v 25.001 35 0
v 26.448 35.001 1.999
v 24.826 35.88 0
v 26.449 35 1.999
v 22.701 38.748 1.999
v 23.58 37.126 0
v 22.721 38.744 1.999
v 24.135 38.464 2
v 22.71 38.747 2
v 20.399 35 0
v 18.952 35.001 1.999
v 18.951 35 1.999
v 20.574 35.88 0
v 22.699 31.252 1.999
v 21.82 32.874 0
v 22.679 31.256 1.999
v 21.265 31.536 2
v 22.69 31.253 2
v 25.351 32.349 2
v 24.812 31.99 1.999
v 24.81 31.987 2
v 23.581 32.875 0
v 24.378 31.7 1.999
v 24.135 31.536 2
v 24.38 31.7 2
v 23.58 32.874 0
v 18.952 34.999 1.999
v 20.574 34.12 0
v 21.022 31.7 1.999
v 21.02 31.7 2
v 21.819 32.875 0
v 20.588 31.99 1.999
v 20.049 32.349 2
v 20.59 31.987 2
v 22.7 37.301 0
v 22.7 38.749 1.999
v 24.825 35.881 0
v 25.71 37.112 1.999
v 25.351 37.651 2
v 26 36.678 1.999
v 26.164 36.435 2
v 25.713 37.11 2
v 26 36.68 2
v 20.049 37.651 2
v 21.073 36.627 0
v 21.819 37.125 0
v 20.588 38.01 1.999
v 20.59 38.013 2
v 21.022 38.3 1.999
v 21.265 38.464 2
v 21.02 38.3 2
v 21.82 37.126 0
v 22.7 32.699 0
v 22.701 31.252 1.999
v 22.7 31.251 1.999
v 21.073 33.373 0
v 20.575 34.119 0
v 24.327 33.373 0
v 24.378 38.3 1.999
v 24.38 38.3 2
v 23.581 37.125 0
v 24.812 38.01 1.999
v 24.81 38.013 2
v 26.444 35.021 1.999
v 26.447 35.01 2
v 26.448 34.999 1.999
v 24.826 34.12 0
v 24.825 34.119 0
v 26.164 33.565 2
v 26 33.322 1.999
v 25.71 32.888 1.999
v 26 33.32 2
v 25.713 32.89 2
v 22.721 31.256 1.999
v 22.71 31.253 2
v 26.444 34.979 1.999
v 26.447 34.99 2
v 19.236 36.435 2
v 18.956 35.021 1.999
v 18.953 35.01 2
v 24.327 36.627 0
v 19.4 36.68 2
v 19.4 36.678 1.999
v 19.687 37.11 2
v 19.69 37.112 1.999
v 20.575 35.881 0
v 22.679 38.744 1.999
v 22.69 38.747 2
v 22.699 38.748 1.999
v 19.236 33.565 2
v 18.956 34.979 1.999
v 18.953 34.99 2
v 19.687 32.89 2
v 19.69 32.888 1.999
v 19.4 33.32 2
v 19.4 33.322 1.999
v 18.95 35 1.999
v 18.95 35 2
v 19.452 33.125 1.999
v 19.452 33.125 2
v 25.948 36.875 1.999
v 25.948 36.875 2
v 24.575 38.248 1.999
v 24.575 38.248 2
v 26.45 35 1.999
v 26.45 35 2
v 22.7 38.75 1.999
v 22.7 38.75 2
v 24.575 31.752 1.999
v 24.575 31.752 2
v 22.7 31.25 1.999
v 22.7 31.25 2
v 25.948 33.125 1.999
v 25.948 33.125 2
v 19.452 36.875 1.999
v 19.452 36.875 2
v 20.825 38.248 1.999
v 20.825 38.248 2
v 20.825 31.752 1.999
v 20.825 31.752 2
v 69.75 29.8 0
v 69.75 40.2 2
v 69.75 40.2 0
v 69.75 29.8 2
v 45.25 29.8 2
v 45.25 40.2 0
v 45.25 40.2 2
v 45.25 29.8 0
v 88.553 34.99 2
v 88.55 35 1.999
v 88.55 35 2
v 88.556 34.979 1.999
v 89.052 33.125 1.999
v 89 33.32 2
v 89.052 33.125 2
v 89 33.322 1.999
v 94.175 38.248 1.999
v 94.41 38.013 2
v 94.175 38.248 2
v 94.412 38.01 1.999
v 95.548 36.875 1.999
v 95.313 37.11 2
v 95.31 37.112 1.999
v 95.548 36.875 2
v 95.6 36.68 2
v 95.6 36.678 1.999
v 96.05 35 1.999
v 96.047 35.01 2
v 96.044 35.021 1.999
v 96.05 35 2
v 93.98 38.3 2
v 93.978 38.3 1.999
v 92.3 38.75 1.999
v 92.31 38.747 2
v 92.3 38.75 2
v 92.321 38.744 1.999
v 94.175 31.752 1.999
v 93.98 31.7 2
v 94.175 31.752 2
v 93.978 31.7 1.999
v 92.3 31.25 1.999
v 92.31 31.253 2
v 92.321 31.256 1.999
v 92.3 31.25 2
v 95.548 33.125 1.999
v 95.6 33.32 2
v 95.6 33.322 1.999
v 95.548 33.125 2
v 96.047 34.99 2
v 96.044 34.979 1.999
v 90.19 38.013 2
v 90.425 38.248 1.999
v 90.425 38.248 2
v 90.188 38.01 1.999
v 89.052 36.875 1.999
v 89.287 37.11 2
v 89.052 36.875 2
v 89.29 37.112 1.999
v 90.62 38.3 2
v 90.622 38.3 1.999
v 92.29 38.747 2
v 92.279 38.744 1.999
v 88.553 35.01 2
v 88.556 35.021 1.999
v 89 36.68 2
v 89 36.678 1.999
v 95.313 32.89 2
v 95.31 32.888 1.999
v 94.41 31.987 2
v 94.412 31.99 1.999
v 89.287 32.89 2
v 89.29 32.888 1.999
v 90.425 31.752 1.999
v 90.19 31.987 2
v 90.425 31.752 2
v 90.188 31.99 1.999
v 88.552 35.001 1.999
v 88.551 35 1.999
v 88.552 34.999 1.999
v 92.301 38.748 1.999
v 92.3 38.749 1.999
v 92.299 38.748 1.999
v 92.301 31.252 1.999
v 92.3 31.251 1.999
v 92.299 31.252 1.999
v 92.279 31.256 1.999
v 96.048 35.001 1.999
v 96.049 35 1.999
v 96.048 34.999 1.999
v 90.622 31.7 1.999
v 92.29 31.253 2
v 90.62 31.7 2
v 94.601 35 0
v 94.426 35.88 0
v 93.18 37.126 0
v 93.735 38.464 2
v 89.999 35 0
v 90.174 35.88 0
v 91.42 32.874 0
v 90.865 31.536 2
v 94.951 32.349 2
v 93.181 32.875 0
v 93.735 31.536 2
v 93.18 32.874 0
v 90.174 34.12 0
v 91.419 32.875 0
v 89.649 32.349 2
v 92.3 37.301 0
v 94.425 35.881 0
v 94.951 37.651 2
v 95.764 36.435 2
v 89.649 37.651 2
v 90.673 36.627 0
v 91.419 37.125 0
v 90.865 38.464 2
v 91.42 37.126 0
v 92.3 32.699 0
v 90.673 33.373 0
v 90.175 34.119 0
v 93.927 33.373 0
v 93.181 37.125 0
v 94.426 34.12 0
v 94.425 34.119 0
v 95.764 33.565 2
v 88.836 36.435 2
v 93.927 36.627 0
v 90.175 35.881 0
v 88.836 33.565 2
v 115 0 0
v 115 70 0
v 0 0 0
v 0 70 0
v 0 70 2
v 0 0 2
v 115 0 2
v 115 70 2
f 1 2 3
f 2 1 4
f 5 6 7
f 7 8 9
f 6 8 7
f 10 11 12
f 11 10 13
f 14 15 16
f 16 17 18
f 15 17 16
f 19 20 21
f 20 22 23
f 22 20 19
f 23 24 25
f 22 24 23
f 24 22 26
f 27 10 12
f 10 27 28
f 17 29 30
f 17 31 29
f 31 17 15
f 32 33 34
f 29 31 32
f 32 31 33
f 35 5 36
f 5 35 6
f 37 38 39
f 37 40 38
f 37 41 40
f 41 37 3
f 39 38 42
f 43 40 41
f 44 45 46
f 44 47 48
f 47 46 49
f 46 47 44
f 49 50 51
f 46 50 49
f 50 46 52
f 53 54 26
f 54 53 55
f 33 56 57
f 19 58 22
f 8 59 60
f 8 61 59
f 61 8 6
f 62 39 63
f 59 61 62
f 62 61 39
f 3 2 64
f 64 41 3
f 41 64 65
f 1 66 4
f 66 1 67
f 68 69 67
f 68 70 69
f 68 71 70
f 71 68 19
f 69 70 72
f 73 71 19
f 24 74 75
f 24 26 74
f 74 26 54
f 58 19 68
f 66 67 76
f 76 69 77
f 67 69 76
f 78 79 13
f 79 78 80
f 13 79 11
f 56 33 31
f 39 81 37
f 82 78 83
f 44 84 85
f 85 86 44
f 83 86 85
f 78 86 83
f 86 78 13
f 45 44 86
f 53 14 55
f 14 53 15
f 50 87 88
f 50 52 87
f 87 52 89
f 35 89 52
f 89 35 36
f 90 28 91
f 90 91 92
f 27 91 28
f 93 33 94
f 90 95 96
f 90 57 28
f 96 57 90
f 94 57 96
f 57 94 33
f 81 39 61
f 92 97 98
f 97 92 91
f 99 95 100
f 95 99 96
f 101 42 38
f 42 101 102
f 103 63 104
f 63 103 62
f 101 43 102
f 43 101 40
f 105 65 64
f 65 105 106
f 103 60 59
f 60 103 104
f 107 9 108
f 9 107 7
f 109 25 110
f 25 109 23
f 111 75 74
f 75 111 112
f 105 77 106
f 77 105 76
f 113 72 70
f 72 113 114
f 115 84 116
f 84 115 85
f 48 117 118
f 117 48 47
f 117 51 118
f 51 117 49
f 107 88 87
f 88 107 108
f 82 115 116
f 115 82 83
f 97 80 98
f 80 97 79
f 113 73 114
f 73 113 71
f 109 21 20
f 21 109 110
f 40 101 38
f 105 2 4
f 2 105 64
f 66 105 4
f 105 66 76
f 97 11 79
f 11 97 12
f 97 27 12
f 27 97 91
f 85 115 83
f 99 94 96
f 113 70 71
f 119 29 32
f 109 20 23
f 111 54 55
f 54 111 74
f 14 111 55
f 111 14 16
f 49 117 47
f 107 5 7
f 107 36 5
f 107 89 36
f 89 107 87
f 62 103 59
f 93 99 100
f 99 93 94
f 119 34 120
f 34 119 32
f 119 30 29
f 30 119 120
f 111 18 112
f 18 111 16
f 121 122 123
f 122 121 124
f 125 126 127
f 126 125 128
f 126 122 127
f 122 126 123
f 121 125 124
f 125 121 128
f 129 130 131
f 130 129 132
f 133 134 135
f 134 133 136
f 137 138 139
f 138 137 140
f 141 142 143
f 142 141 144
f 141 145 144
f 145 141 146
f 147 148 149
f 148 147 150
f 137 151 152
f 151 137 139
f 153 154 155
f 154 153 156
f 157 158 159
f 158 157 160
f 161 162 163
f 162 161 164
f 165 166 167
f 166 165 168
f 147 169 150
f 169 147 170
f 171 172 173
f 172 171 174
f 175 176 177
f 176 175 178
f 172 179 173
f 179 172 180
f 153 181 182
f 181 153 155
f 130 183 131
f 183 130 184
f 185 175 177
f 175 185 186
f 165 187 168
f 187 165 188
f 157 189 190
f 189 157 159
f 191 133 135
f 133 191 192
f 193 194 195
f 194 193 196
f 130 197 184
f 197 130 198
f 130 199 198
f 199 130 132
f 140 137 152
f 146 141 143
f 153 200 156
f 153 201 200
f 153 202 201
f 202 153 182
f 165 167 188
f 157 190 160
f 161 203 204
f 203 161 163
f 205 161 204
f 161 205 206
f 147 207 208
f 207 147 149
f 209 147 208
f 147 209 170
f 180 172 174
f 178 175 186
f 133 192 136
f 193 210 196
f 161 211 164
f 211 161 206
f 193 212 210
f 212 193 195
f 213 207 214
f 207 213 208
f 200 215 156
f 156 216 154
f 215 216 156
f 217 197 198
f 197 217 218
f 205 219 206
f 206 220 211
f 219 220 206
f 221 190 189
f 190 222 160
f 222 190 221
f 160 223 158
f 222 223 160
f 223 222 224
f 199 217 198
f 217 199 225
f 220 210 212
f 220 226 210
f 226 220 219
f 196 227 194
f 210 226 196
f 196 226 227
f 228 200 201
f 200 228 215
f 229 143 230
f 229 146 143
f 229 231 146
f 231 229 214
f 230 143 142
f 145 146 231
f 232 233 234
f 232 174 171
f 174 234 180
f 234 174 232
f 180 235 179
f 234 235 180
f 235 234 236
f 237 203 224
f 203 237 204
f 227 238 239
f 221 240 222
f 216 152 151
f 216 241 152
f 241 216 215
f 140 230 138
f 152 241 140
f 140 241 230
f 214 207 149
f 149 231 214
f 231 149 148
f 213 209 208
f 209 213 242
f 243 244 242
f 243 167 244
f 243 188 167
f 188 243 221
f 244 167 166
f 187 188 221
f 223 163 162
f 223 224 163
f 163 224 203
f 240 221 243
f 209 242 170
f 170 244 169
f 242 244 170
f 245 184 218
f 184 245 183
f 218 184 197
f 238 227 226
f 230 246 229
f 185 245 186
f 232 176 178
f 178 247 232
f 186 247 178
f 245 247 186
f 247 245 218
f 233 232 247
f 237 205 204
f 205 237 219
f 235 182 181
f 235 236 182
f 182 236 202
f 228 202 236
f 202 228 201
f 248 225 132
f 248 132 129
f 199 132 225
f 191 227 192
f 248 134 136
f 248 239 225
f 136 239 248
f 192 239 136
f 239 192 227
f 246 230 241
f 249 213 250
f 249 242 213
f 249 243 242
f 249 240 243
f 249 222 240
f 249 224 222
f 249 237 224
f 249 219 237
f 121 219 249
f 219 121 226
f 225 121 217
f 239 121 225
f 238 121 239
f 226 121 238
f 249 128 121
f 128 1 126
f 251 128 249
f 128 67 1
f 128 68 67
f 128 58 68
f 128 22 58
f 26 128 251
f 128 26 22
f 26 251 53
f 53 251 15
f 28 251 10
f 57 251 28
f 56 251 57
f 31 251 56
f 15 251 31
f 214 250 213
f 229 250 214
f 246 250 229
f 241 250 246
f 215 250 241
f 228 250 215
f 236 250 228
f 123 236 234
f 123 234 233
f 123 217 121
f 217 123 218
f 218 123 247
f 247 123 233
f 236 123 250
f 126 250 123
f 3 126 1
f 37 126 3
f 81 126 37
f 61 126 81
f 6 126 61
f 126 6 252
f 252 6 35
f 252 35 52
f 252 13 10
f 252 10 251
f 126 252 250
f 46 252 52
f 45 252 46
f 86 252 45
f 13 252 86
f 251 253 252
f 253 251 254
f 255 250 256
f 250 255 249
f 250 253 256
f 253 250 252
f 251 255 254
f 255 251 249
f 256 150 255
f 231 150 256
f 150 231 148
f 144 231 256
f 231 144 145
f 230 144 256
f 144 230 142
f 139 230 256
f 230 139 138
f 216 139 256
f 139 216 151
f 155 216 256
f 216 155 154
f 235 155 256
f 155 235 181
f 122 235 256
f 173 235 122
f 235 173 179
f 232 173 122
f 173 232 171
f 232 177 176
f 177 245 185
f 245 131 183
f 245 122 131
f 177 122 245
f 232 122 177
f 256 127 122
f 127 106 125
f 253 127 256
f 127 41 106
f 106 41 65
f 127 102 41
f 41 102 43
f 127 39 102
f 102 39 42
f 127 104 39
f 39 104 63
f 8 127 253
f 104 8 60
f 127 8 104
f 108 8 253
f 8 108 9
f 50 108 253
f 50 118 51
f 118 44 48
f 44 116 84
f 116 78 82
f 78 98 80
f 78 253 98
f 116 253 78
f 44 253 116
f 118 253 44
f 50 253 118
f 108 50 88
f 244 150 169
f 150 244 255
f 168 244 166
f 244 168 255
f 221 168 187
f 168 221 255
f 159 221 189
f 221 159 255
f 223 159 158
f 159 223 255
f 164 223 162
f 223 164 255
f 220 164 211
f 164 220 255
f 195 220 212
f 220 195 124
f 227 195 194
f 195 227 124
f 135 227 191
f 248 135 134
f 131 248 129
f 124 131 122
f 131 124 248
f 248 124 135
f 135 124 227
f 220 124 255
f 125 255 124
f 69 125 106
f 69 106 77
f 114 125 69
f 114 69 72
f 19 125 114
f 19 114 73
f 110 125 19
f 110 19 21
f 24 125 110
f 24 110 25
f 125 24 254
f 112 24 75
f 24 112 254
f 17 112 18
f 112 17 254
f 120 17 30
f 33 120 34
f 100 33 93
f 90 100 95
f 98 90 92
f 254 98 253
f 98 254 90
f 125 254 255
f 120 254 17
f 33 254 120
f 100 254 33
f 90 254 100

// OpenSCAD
difference(){
	union() {
		union() {
			union() {
				cube(size = [115, 70, 2]);
			}
		}
	}
	/* Holes Below*/
	union(){
		union(){
			union(){
				union() {
					union() {
						translate(v = [45.2500000000, 29.8000000000, -1]) {
							cube(size = [24.5000000000, 10.4000000000, 1000]);
						}
						translate(v = [22.7000000000, 35, -0.0010000000]) {
							union() {
								cylinder($fn = 16, h = 2.0020000000, r1 = 2.3000000000, r2 = 3.7500000000);
								translate(v = [0, 0, 2]) {
									cylinder(h = 1000, r = 3.7500000000);
								}
							}
						}
					}
					translate(v = [92.3000000000, 35, -0.0010000000]) {
						union() {
							translate(v = [0, 0, 2]) {
								cylinder(h = 1000, r = 3.7500000000);
							}
							cylinder($fn = 16, h = 2.0020000000, r1 = 2.3000000000, r2 = 3.7500000000);
						}
					}
				}
			}
			union() {
				union() {
					union() {
						union() {
							translate(v = [-1000, -1000, -100]) {
								cube(size = [2000, 2000, 100]);
							}
							translate(v = [-1000, -1000, 0]) {
								cube(size = [1000, 2000, 2]);
							}
						}
						translate(v = [115, -1000, 0]) {
							cube(size = [1000, 2000, 2]);
						}
					}
					translate(v = [0, 70, 0]) {
						cube(size = [1000, 1000, 2]);
					}
				}
				translate(v = [0, -1000, 0]) {
					cube(size = [1000, 1000, 2]);
				}
			}
		}
	} /* End Holes */ 
}
